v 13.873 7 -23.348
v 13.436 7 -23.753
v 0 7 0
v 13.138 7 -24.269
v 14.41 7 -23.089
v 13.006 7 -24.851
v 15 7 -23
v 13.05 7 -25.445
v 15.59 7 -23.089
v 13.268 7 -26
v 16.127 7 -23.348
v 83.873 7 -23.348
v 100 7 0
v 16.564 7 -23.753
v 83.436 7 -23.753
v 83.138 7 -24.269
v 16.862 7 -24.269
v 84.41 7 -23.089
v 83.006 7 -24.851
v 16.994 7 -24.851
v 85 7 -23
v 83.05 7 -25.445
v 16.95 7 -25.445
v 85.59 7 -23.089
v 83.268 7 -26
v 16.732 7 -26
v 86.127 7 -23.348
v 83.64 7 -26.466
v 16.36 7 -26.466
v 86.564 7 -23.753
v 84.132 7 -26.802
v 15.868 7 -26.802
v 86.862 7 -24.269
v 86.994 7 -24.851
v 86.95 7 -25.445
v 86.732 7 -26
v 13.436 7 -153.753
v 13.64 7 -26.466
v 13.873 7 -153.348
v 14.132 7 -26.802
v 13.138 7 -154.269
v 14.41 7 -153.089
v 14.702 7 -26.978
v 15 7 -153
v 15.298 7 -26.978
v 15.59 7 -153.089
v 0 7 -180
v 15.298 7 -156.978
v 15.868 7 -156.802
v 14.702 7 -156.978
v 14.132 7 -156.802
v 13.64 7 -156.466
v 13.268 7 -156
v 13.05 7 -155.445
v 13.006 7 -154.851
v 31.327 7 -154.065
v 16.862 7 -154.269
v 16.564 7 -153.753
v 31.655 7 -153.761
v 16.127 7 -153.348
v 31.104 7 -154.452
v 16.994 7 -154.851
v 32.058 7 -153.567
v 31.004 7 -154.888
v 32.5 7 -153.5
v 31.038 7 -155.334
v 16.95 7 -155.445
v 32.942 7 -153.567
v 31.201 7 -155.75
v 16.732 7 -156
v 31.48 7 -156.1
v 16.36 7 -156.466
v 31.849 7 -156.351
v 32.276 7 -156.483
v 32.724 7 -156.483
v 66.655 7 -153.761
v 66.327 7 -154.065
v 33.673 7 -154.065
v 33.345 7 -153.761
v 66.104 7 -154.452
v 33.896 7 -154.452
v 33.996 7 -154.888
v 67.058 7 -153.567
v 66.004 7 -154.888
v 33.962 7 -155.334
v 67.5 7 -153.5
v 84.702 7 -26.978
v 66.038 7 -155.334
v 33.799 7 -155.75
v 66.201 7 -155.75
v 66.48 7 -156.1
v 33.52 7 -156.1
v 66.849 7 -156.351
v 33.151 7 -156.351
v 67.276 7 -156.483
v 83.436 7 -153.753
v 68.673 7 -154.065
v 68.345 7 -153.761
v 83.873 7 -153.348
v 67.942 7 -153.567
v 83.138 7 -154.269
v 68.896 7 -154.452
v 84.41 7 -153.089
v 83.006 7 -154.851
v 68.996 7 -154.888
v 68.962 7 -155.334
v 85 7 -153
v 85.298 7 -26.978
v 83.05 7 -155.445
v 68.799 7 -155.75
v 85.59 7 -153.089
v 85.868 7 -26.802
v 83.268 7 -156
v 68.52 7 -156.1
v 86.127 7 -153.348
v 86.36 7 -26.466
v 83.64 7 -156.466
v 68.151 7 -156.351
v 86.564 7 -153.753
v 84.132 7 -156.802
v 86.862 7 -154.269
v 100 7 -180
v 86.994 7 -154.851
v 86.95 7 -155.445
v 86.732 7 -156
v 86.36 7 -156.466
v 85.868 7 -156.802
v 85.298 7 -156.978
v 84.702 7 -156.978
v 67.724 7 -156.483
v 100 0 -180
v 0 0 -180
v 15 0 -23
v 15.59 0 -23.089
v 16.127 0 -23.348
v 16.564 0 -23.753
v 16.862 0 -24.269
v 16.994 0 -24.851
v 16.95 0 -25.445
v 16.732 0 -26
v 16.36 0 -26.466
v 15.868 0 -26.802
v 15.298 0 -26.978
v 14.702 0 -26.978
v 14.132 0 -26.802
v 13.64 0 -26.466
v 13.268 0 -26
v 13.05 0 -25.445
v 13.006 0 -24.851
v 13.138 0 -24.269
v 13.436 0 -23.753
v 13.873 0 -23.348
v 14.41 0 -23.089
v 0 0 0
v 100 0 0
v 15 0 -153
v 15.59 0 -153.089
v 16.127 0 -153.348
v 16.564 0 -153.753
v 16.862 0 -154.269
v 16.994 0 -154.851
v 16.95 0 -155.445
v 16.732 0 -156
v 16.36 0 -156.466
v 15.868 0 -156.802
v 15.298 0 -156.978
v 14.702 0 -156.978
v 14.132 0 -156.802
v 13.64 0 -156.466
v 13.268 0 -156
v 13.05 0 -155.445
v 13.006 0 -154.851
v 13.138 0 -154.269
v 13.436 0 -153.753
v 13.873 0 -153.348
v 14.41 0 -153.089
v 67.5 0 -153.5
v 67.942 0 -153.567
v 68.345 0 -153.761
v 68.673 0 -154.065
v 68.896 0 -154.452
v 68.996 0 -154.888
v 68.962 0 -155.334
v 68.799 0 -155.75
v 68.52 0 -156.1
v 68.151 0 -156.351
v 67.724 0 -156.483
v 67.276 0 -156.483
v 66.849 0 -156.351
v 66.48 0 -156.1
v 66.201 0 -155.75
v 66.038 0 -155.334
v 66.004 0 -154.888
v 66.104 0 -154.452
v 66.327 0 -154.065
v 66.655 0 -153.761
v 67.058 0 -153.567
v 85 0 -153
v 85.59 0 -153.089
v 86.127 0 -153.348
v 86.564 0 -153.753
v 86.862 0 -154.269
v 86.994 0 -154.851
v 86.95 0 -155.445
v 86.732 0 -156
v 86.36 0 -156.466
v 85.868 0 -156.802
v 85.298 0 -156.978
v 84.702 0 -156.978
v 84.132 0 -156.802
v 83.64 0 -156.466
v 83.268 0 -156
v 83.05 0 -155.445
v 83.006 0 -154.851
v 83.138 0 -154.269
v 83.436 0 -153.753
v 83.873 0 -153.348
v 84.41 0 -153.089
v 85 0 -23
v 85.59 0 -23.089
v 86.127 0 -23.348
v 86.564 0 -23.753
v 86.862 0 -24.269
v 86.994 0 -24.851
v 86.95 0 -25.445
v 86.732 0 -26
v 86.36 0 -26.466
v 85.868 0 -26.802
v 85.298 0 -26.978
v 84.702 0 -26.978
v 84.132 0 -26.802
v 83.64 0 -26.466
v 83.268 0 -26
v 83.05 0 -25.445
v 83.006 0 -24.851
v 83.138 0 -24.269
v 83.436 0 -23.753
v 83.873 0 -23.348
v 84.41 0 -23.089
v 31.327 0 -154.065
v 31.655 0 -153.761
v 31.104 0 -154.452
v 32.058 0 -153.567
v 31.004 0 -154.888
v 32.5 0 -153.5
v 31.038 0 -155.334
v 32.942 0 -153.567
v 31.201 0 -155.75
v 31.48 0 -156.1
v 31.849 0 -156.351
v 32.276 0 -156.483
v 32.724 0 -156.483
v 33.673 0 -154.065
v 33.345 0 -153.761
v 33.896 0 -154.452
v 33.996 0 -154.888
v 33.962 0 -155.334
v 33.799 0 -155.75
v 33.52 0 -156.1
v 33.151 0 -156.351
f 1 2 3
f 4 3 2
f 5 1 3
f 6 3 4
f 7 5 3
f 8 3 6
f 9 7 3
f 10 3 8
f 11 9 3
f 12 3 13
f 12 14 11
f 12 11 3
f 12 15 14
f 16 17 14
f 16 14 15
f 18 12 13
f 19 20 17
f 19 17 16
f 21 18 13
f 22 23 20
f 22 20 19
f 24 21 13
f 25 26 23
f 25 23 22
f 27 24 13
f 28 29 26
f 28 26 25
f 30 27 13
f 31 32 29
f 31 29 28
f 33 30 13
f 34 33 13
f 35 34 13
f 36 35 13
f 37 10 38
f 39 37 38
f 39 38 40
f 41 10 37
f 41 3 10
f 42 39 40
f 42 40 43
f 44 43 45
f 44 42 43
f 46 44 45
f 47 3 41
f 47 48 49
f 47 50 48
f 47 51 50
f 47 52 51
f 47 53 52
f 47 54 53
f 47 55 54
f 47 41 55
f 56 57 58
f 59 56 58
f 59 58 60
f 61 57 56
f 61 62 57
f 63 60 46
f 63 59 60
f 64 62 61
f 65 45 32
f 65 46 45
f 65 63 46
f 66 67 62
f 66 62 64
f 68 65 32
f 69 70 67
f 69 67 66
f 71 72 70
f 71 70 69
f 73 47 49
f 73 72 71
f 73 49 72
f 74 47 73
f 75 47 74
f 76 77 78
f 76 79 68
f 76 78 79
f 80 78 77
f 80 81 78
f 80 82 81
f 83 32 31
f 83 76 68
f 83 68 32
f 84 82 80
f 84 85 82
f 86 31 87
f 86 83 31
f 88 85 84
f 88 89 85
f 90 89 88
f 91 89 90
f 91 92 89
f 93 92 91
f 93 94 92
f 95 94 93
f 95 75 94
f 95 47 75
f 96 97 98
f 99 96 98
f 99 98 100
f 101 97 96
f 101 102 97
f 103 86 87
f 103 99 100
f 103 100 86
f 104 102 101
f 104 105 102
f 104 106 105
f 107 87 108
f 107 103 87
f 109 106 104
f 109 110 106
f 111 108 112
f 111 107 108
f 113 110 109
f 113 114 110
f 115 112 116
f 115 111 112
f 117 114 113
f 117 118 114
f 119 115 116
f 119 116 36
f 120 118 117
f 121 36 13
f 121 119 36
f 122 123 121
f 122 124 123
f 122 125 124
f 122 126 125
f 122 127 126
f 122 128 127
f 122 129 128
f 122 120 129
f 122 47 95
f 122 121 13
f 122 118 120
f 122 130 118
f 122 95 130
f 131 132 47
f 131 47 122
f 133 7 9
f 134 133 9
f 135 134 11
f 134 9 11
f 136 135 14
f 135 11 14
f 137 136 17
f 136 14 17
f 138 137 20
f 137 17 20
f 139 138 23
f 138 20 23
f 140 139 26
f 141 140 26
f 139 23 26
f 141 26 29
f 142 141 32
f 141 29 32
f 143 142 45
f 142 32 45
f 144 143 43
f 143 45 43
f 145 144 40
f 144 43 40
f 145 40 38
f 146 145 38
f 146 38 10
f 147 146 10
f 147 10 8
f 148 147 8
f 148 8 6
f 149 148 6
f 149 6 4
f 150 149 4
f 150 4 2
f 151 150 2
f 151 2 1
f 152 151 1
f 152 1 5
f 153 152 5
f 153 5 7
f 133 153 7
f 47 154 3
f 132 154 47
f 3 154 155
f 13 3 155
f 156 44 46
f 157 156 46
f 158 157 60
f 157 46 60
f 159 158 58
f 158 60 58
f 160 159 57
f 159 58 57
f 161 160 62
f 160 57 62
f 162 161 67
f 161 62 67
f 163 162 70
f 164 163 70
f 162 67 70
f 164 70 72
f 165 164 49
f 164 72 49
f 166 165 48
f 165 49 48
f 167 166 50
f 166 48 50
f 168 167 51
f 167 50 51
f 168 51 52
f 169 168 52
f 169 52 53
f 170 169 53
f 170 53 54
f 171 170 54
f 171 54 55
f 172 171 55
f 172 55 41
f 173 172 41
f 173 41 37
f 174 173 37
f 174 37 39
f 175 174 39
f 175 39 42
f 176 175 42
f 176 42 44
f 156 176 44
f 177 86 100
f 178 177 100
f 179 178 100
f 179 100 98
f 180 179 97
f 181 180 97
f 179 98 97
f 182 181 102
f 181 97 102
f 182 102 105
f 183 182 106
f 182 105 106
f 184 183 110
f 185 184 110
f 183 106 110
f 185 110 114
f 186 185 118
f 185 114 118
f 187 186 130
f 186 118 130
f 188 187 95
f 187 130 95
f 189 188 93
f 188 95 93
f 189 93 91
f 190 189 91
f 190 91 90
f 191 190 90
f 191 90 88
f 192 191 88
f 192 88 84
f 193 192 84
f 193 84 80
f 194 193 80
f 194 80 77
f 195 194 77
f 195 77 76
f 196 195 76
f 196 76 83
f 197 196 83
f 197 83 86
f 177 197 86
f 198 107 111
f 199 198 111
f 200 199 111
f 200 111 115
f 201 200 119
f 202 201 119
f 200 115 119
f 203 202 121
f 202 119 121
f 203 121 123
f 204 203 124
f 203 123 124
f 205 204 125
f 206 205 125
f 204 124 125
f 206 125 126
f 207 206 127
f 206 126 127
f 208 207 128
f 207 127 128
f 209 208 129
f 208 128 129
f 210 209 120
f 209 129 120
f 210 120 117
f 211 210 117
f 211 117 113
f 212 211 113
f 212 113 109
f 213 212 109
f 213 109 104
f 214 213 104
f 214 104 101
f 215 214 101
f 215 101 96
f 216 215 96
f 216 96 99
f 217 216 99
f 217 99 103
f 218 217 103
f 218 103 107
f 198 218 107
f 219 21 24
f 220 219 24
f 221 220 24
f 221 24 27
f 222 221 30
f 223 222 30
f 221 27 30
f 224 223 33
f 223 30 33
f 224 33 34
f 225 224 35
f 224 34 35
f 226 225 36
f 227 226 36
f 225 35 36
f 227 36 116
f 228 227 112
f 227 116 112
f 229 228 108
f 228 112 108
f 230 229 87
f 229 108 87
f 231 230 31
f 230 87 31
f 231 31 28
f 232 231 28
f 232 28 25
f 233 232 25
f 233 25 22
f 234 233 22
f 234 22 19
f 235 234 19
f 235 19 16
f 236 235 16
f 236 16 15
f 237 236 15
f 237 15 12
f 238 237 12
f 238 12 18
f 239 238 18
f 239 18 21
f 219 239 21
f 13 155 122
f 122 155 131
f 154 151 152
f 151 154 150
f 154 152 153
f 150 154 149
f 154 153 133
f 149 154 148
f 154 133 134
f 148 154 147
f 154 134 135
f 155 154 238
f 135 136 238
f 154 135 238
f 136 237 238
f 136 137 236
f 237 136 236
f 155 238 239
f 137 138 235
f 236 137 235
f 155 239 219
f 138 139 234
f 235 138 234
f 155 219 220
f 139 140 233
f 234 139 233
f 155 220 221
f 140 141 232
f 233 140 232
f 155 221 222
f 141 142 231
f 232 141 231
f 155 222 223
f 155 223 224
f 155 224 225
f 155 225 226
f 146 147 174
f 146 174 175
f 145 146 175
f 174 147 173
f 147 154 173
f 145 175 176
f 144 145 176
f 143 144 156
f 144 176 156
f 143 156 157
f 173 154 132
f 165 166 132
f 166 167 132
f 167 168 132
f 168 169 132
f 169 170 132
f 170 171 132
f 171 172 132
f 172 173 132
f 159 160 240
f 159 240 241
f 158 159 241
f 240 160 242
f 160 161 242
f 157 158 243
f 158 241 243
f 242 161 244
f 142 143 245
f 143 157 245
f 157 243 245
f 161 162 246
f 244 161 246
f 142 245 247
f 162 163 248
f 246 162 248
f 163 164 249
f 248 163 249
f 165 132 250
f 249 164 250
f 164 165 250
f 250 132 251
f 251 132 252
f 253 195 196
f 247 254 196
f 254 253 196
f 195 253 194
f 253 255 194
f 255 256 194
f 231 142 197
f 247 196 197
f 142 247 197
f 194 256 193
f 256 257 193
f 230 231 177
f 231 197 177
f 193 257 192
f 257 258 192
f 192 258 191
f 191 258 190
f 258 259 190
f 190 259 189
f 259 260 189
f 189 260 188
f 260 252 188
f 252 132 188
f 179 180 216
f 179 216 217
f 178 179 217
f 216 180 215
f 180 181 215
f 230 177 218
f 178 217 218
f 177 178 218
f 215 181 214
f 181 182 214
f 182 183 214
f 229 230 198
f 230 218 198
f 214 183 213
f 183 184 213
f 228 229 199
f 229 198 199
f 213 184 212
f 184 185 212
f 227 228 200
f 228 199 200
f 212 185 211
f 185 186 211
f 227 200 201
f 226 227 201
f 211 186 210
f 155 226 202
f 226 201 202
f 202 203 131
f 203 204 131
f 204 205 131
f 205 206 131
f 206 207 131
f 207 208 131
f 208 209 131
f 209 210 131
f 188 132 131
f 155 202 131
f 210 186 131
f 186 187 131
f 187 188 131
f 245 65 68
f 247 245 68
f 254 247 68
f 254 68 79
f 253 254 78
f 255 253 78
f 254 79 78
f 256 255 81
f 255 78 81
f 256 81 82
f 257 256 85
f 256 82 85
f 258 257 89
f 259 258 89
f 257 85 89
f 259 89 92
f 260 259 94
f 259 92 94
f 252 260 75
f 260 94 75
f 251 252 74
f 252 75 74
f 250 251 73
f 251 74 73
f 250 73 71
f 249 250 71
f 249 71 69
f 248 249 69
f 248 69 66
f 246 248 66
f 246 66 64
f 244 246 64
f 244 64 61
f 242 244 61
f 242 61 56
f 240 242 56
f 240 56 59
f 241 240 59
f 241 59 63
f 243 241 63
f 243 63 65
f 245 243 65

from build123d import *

# Parameters (mm, degrees)
SKETCH1_W           = 100
SKETCH1_H           = 180
BOSS_EXTRUDE1_DEPTH = 7
SKETCH3_R           = 2
CUT_EXTRUDE1_DEPTH  = 207.031550982
SKETCH4_R           = 1.5
CUT_EXTRUDE2_DEPTH  = 207.031550982


with BuildPart() as part:
    # Sketch1 → Boss-Extrude1 (new body)
    with BuildSketch(Plane(origin=(0, 0, 0), x_dir=(1, 0, 0), z_dir=(0, 1, 0))):
        with Locations((50, 90)):
            Rectangle(SKETCH1_W, SKETCH1_H)
    extrude(amount=BOSS_EXTRUDE1_DEPTH)

    # Sketch3 → Cut-Extrude1 (cut, through all)
    with BuildSketch(Plane(origin=(0, 7, 0), x_dir=(1, 0, 0), z_dir=(0, 1, 0))):
        with Locations(Location((15, 25, 0), (0, 0, 270))):
            Circle(SKETCH3_R)
        with Locations(Location((85, 25, 0), (0, 0, 270))):
            Circle(SKETCH3_R)
        with Locations(Location((15, 155, 0), (0, 0, 270))):
            Circle(SKETCH3_R)
        with Locations(Location((85, 155, 0), (0, 0, 270))):
            Circle(SKETCH3_R)
    extrude(amount=-CUT_EXTRUDE1_DEPTH, mode=Mode.SUBTRACT)

    # Sketch4 → Cut-Extrude2 (cut, through all)
    with BuildSketch(Plane(origin=(0, 7, 0), x_dir=(1, 0, 0), z_dir=(0, 1, 0))):
        with Locations(Location((32.5, 155, 0), (0, 0, 270))):
            Circle(SKETCH4_R)
        with Locations(Location((67.5, 155, 0), (0, 0, 270))):
            Circle(SKETCH4_R)
    extrude(amount=-CUT_EXTRUDE2_DEPTH, mode=Mode.SUBTRACT)


solid = part.part
